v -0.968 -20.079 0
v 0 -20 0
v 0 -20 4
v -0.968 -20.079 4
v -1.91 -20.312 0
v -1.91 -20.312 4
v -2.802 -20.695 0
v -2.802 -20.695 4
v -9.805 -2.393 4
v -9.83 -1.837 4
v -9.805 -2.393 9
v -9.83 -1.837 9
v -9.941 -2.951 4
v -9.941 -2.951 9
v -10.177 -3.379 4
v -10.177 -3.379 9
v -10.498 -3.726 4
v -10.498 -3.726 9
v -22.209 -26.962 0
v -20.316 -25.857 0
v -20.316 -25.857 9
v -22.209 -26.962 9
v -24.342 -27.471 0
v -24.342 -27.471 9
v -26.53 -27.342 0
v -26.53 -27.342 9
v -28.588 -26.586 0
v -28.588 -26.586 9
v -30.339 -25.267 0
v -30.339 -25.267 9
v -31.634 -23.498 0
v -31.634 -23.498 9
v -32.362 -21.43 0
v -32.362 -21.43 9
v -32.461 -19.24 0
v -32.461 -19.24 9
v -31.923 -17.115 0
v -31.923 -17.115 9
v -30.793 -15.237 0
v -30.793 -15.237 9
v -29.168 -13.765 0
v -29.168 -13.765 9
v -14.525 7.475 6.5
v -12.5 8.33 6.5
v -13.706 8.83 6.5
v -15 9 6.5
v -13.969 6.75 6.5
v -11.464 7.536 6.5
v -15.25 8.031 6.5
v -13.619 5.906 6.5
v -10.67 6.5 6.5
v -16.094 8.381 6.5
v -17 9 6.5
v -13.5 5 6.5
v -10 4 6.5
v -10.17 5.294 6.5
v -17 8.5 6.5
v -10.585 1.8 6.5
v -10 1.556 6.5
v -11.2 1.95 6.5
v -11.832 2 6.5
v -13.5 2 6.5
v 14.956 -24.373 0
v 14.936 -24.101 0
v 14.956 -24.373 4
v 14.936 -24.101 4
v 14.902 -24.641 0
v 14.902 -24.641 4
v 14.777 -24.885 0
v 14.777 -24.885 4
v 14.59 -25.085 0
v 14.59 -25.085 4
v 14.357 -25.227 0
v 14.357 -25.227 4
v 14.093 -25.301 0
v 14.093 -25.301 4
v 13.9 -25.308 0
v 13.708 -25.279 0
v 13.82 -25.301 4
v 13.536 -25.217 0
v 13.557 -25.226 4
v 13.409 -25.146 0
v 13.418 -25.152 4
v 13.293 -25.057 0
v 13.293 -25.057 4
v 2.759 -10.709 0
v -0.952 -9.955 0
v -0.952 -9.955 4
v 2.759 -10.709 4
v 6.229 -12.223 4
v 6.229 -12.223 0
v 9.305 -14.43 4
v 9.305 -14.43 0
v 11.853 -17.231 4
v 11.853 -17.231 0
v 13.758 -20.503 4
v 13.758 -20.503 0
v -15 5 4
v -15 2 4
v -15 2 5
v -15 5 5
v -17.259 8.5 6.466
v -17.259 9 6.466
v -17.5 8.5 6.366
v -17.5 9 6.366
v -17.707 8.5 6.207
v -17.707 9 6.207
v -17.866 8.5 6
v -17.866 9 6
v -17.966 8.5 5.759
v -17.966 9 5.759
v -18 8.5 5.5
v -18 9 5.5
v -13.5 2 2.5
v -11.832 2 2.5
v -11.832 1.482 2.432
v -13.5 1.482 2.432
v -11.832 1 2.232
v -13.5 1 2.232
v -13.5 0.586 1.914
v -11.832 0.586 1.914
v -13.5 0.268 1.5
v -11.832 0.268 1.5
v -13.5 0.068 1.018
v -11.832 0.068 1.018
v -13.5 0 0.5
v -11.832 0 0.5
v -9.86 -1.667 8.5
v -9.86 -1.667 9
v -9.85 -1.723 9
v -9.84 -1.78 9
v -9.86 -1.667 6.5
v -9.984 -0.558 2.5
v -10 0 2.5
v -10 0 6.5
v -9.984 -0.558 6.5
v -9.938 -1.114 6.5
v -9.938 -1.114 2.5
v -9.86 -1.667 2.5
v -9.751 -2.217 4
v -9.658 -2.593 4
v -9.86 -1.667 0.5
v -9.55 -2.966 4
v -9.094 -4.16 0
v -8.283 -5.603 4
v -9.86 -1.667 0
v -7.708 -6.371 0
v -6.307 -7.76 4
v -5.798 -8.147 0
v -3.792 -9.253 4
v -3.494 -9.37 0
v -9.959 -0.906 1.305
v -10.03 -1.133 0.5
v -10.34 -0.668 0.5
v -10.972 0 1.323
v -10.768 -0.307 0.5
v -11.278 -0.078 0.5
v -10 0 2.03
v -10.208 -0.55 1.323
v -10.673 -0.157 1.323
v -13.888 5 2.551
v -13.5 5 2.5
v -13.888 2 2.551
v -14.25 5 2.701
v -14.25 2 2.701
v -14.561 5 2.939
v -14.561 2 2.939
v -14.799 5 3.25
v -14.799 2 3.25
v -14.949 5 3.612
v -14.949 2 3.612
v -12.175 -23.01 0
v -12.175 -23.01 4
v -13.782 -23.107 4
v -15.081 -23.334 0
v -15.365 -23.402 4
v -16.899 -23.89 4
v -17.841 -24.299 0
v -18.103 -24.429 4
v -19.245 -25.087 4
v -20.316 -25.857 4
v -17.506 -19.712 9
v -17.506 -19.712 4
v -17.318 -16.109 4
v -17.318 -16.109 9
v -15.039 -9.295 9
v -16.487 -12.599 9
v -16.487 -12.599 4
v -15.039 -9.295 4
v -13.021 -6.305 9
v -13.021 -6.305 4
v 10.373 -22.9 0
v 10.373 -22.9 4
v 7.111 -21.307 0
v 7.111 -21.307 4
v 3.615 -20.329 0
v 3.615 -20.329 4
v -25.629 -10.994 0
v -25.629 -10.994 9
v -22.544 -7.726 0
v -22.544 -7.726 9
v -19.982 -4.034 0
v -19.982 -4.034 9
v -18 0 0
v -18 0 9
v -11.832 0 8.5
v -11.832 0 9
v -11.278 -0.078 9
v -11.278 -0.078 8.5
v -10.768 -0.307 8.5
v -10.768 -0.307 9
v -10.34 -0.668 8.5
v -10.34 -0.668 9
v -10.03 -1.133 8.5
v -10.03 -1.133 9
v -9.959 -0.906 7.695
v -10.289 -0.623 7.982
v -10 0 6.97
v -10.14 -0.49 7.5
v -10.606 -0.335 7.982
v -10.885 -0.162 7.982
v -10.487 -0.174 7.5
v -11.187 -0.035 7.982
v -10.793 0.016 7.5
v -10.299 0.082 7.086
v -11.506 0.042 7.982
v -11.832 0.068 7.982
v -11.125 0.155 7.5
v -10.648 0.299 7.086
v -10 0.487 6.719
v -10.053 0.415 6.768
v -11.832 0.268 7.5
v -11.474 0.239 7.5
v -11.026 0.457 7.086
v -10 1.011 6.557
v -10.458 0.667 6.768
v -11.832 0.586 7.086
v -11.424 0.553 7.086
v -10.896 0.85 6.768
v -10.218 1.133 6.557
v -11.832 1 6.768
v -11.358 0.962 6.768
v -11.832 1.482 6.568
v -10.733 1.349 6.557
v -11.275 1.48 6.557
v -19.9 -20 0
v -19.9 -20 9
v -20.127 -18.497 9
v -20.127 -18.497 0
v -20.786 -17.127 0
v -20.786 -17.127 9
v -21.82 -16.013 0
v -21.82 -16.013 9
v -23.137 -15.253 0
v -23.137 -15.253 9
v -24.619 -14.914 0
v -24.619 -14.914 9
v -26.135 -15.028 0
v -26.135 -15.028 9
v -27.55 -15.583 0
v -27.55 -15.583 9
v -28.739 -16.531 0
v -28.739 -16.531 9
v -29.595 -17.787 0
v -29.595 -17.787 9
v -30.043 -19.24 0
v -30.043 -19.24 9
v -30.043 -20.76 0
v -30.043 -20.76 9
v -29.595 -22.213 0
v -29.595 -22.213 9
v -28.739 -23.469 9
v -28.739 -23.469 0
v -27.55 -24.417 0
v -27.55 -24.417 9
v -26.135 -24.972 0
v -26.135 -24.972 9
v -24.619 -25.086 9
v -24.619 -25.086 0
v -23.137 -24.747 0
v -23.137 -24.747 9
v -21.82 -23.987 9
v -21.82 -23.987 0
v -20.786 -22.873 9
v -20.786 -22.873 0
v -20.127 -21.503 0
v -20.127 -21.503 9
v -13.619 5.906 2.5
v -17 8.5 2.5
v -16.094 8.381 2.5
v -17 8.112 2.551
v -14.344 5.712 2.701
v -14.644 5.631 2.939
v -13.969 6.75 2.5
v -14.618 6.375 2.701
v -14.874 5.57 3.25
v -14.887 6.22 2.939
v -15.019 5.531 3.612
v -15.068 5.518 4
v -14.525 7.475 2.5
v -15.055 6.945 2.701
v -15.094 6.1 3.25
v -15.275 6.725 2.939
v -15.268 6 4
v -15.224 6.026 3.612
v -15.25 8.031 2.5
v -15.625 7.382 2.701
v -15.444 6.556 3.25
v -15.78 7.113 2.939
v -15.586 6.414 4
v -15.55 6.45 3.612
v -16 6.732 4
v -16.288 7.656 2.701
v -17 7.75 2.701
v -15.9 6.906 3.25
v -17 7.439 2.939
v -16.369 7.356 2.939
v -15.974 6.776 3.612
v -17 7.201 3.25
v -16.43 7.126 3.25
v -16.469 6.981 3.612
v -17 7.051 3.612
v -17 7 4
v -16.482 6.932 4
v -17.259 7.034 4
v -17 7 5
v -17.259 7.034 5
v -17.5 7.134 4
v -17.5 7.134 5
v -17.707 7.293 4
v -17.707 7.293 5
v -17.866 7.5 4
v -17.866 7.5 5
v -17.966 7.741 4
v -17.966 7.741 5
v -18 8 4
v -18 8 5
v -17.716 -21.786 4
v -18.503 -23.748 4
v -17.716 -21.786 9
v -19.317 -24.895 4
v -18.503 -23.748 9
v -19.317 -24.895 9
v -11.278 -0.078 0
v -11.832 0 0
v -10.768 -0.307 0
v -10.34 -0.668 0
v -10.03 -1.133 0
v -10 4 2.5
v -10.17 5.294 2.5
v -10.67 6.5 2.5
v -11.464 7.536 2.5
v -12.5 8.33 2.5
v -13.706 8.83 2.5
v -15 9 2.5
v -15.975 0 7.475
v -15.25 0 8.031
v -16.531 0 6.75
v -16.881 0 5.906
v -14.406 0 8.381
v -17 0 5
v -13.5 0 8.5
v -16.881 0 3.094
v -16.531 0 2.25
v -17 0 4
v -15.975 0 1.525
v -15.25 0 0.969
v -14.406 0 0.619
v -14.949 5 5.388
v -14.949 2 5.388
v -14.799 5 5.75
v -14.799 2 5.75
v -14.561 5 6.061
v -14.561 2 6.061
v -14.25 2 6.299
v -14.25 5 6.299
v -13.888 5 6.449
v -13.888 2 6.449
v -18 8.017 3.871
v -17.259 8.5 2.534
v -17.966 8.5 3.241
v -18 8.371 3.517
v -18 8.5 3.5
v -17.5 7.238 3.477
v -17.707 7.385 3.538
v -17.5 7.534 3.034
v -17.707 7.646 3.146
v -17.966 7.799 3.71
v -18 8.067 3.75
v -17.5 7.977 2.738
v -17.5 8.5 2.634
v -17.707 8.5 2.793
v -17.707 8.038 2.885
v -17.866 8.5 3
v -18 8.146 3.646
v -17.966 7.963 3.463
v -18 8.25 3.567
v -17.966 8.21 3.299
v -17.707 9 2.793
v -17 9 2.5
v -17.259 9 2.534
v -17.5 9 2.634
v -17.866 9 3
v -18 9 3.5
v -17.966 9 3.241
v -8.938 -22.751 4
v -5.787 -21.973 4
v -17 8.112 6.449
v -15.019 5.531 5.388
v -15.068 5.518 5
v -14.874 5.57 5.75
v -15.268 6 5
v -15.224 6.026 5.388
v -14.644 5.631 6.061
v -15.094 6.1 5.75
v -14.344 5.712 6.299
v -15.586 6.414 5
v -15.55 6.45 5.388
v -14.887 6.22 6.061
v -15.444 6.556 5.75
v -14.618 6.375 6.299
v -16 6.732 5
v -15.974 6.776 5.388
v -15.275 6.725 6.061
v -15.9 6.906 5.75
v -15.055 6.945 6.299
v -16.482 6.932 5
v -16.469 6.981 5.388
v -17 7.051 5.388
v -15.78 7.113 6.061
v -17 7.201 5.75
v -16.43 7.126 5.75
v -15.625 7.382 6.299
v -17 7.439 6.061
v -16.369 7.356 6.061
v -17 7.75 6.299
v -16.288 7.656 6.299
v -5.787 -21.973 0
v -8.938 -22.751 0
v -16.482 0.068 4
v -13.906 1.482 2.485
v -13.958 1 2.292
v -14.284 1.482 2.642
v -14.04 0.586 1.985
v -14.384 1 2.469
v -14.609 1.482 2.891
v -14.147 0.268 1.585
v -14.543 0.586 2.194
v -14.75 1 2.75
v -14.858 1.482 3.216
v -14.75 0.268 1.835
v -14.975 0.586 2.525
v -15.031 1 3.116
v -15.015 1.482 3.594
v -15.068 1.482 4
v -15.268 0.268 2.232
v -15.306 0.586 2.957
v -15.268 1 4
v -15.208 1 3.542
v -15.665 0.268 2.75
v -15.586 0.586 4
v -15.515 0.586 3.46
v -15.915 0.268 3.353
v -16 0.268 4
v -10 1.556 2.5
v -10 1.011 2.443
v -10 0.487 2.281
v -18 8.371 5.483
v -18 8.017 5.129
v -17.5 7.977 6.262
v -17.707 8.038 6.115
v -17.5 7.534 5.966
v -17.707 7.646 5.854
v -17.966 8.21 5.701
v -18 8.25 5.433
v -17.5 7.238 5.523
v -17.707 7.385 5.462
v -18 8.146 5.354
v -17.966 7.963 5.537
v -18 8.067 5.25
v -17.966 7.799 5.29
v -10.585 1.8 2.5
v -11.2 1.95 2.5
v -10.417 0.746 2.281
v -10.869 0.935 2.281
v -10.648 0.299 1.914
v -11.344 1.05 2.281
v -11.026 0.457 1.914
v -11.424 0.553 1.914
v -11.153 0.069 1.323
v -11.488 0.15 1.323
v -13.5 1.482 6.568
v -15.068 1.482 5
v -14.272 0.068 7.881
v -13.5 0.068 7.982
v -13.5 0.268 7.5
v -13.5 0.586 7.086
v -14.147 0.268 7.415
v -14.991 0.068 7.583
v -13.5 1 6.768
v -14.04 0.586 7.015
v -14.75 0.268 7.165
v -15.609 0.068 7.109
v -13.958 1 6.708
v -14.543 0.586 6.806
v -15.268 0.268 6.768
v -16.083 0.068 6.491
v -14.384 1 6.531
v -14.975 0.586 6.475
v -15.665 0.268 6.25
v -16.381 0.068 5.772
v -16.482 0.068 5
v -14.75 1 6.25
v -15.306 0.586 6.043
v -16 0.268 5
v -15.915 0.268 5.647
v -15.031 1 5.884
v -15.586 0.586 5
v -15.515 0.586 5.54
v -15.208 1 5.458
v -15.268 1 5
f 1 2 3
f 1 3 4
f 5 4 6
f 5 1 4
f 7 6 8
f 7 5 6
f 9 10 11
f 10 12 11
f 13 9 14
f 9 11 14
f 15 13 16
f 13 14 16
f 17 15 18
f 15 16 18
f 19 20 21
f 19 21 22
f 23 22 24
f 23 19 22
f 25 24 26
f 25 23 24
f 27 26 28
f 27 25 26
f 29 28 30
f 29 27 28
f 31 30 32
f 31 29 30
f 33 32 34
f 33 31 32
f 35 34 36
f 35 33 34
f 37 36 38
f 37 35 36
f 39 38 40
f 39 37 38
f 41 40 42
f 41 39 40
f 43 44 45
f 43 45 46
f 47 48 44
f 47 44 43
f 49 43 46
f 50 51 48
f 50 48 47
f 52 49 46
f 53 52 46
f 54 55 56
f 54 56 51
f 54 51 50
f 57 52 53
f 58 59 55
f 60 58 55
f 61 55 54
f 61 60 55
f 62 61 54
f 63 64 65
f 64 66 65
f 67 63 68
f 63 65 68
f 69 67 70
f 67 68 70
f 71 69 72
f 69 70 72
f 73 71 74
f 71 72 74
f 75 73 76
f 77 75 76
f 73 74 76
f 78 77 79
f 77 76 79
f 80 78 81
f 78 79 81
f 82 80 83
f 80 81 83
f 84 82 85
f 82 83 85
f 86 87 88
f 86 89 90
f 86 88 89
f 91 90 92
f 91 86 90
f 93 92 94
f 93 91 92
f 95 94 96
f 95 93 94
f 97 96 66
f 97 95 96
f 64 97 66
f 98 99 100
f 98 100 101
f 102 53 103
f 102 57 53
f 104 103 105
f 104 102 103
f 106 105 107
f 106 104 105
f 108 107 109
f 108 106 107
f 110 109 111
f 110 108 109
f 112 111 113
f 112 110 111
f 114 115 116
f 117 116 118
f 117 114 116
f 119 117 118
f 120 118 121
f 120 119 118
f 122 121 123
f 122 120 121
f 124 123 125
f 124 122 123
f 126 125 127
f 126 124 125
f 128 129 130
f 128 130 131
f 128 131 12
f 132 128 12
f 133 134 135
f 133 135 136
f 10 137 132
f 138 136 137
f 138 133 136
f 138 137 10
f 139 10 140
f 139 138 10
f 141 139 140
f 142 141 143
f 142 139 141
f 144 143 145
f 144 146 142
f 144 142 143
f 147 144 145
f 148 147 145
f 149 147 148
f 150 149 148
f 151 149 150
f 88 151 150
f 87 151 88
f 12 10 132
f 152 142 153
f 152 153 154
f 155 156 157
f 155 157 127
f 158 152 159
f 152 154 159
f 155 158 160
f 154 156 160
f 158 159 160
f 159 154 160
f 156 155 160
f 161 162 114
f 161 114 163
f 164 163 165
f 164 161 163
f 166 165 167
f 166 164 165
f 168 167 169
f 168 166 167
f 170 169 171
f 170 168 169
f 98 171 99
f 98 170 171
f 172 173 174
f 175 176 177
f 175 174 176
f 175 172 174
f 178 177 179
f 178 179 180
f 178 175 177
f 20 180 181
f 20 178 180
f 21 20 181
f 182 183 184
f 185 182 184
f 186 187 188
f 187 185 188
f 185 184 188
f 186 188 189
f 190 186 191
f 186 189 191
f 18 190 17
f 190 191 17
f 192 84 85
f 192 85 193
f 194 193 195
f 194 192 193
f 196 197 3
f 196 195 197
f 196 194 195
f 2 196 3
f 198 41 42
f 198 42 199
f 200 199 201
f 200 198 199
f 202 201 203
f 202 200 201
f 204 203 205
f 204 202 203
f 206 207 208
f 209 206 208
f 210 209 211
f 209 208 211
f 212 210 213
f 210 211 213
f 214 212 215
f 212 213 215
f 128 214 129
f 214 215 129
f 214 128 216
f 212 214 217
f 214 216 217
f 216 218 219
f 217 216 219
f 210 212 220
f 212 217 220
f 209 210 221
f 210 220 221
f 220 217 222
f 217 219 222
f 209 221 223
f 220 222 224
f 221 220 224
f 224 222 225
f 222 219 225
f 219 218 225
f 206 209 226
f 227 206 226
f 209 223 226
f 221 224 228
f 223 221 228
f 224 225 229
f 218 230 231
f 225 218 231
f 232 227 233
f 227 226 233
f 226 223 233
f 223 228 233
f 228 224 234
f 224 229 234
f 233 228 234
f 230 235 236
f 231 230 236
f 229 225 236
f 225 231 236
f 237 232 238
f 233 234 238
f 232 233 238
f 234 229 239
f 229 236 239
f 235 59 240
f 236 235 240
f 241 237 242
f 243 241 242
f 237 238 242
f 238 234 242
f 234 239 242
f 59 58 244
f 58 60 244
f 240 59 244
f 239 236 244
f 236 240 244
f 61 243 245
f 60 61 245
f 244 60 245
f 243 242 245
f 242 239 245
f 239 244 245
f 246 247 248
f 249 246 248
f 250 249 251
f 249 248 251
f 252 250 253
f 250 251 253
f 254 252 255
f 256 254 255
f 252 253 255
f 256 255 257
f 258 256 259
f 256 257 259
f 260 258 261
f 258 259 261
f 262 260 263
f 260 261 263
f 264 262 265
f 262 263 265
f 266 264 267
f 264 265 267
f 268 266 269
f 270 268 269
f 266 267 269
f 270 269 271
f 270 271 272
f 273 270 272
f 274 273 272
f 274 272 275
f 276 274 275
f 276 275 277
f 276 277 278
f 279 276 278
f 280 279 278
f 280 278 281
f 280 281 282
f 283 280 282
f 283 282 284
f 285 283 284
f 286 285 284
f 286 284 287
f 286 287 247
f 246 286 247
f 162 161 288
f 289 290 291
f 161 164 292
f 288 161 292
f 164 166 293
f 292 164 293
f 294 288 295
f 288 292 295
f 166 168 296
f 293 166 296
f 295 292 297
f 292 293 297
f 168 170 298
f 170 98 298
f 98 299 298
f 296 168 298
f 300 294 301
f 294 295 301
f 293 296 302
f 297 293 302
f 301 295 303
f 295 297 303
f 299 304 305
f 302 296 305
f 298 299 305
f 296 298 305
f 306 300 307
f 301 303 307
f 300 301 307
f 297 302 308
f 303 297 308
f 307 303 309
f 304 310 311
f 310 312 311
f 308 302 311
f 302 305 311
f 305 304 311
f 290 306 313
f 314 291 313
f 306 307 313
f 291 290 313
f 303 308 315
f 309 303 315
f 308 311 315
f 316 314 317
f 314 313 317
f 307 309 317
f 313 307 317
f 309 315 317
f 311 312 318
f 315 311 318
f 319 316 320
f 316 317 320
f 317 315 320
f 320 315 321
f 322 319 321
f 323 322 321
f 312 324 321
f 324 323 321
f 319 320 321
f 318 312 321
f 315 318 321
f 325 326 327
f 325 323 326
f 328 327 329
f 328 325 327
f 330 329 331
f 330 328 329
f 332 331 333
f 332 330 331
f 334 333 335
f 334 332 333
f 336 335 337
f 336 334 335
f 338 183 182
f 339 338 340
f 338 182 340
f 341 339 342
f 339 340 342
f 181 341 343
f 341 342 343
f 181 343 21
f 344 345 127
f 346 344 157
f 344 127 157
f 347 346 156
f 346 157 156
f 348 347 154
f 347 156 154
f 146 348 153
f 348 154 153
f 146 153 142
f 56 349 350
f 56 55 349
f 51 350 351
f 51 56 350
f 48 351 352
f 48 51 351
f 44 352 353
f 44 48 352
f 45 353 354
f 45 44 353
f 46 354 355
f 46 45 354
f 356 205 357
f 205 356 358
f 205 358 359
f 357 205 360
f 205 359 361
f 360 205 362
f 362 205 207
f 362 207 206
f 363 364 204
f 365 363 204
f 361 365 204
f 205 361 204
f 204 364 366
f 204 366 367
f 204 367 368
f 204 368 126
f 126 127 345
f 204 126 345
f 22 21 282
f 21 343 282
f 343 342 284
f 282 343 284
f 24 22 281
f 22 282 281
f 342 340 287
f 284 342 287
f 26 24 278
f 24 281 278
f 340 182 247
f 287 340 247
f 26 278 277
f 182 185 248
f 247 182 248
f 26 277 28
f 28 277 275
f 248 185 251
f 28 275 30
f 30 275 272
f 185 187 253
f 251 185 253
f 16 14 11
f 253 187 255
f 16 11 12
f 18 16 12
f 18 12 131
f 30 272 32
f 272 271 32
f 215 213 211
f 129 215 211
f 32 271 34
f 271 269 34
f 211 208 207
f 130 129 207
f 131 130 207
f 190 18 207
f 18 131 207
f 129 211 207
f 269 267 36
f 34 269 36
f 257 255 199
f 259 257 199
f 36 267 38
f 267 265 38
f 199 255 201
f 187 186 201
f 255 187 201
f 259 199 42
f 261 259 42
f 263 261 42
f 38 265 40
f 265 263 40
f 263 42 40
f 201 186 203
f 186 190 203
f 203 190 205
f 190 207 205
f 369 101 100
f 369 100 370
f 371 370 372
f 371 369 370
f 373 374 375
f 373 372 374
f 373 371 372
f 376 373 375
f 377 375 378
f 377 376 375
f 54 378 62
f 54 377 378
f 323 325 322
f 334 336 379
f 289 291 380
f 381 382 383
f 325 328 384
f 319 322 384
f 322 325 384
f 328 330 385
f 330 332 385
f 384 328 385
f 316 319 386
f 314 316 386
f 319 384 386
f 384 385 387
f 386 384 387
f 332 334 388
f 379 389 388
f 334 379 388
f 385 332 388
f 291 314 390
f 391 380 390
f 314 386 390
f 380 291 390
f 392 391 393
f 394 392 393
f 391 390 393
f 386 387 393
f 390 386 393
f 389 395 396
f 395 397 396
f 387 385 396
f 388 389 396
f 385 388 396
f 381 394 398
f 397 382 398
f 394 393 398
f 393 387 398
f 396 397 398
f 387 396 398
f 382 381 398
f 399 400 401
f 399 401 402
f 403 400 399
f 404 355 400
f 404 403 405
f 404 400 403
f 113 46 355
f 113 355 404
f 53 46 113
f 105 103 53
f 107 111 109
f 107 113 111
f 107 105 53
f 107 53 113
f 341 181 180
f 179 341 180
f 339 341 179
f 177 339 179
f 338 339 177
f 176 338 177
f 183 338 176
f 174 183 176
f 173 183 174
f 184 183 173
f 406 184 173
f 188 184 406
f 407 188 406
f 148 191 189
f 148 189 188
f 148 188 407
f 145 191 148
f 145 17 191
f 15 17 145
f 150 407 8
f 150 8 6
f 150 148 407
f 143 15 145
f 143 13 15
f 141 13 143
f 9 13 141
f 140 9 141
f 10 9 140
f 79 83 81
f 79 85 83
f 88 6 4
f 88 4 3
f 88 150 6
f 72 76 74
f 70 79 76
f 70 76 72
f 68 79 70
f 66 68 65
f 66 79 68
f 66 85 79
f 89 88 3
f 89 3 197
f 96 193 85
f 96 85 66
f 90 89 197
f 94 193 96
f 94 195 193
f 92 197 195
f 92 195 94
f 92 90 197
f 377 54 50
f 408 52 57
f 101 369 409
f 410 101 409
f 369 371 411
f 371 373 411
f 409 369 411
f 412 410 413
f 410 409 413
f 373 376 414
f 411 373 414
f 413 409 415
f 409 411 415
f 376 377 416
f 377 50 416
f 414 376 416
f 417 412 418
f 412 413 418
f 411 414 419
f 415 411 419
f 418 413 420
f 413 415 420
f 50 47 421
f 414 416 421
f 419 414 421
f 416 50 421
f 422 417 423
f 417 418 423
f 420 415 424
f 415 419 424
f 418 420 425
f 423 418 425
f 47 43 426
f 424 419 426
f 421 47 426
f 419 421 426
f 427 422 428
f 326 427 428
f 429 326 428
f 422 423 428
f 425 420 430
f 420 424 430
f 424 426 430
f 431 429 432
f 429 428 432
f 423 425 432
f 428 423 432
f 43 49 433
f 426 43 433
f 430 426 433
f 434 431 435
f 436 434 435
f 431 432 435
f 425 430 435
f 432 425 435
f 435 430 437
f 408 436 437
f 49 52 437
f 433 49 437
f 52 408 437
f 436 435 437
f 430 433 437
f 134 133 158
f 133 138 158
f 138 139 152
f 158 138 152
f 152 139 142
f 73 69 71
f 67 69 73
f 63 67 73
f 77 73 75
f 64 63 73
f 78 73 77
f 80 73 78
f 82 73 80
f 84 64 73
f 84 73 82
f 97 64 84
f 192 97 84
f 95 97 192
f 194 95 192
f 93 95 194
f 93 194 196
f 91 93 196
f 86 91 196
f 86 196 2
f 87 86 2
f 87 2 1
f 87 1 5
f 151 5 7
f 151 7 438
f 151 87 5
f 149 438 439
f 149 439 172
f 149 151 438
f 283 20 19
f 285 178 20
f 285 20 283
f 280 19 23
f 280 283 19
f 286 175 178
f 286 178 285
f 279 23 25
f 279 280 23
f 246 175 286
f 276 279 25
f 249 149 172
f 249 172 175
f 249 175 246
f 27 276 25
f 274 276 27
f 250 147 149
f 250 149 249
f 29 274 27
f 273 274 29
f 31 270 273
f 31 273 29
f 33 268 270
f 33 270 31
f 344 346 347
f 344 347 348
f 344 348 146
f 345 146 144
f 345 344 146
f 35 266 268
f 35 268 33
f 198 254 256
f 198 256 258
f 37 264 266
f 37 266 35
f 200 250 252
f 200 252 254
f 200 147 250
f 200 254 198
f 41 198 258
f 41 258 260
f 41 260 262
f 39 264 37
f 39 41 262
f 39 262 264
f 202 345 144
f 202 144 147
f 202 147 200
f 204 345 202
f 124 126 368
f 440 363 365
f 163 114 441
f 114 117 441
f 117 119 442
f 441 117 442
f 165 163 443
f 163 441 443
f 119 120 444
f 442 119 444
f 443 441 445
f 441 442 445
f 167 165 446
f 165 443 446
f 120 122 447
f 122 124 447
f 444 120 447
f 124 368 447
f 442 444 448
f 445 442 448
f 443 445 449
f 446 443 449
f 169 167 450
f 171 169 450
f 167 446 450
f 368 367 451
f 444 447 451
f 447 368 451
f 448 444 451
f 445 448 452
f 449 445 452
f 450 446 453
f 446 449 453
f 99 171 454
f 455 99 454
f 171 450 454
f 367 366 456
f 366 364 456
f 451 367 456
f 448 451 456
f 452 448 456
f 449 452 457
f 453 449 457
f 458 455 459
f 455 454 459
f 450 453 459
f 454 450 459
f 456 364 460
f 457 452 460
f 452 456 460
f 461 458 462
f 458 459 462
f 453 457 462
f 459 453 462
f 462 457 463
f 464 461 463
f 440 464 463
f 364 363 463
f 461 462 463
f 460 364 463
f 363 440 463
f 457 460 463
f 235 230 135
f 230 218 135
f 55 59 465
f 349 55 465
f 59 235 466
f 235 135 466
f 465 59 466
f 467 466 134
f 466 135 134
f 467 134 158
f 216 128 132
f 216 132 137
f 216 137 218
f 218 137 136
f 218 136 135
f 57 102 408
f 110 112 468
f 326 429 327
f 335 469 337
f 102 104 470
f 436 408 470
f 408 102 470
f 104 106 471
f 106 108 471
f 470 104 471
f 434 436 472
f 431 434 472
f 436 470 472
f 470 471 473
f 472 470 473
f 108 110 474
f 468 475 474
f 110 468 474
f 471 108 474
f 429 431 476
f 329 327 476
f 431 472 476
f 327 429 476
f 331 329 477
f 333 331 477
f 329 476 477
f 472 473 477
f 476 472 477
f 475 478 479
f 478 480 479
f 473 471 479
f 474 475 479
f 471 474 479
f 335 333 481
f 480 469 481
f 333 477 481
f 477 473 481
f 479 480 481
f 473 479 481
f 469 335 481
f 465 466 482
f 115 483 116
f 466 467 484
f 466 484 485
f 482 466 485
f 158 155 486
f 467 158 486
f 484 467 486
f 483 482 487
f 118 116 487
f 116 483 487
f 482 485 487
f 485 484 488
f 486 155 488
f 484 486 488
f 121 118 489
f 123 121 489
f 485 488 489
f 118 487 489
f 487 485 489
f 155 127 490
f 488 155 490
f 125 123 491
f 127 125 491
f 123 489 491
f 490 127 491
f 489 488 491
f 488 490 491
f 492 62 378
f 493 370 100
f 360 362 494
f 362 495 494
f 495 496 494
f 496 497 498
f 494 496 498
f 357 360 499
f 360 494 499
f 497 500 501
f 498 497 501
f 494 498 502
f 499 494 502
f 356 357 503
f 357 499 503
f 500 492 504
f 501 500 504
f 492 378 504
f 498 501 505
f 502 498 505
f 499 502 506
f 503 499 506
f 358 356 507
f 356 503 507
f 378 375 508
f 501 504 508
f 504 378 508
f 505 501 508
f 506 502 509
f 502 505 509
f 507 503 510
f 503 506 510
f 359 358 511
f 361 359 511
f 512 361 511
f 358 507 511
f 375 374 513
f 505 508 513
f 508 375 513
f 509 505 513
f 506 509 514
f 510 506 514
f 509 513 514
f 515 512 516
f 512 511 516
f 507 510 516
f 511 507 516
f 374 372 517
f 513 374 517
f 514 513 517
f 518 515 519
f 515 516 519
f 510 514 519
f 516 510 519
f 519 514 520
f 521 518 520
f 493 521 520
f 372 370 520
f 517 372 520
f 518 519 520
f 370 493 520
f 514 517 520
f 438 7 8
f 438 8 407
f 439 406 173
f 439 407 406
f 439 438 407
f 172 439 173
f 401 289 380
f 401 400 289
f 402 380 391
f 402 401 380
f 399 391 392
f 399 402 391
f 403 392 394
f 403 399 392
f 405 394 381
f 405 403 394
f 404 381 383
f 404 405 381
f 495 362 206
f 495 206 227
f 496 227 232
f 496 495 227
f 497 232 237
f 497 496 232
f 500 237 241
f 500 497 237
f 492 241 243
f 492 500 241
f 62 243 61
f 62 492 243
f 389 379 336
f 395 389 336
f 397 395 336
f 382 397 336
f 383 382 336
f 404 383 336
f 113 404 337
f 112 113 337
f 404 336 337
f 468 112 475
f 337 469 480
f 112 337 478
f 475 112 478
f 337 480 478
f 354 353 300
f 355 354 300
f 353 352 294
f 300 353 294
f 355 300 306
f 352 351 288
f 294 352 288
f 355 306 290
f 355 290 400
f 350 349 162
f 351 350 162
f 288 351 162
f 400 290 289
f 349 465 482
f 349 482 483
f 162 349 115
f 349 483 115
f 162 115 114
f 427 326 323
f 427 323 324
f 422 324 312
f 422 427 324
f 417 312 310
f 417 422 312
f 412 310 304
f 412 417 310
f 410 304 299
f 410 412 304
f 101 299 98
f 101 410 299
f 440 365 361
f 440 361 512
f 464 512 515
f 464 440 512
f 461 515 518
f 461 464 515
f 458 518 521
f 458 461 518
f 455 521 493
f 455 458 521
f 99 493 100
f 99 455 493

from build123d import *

# Parameters (mm, degrees)
EXTRUDE_1_DEPTH     = 9
CUT_EXTRUDE_START   = -5
CUT_EXTRUDE_1_DEPTH = 5
SKETCH_12_W         = 2.5
SKETCH_12_H         = 7
CUT_EXTRUDE_3_DEPTH = 42.911887352
FILLET_11_R         = 2
FILLET_1_R          = 1
SKETCH_10_W         = 8
SKETCH_10_H         = 4
EXTRUDE_3_DEPTH     = 2
FILLET_5_R          = 5
FILLET_10_R         = 7.5
FILLET_14_R         = 2
FILLET_15_R         = 1.5
FILLET_16_R         = 2
FILLET_17_R         = 1
FILLET_18_R         = 2
SKETCH_11_R         = 5.1
CUT_EXTRUDE_2_DEPTH = 44.514365603


# Some blends are built 0.0001 mm under size
with BuildPart() as part:
    # Эскиз2 → Бобышка-Вытянуть1 (new body)
    with BuildSketch(Plane.XY):
        with BuildLine():
            Line((-18, 0), (-15, 0))
            Line((-15, 0), (-15, 7))
            Line((-15, 7), (-10, 7))
            Line((-10, 7), (-10, 0))
            ThreePointArc((-10, 0), (-7.39984978, -6.726233956), (-0.951555354, -9.954624172))
            ThreePointArc((-0.951555354, -9.954624172), (10.407523967, -15.498539394), (15.320888862, -27.144247806))
            ThreePointArc((15.320888862, -27.144247806), (8.452365235, -21.873844259), (0, -20))
            ThreePointArc((0, -20), (-1.44344914, -20.176216472), (-2.802111775, -20.69451514))
            ThreePointArc((-2.802111775, -20.69451514), (-7.346697493, -22.426064476), (-12.174852362, -23.009539415))
            ThreePointArc((-12.174852362, -23.009539415), (-16.488233618, -23.738589268), (-20.315570084, -25.857142338))
            ThreePointArc((-20.315570084, -25.857142338), (-31.05163084, -24.430323259), (-29.168151763, -13.764896883))
            ThreePointArc((-29.168151763, -13.764896883), (-22.544234788, -7.726123715), (-18, 0))
        make_face()
    extrude(amount=EXTRUDE_1_DEPTH)

    # Эскиз6 → Вырез-Вытянуть1 (cut)
    with BuildSketch(Plane.XY.offset(9).offset(CUT_EXTRUDE_START)):
        with BuildLine():
            ThreePointArc((-9.55, -2.96605799), (-16.390256677, -12.316180922), (-16.898984287, -23.890078556))
            ThreePointArc((-16.898984287, -23.890078556), (-14.577958647, -23.229625817), (-12.174852362, -23.009539415))
            ThreePointArc((-12.174852362, -23.009539415), (-7.346697493, -22.426064476), (-2.802111775, -20.69451514))
            ThreePointArc((-2.802111775, -20.69451514), (-1.44344914, -20.176216472), (0, -20))
            ThreePointArc((0, -20), (8.452365235, -21.873844259), (15.320888862, -27.144247806))
            ThreePointArc((15.320888862, -27.144247806), (10.407523967, -15.498539394), (-0.951555354, -9.954624172))
            ThreePointArc((-0.951555354, -9.954624172), (-6.307192762, -7.760110789), (-9.55, -2.96605799))
        make_face()
    extrude(amount=CUT_EXTRUDE_1_DEPTH, mode=Mode.SUBTRACT)

    # Эскиз12 → Вырез-Вытянуть3 (cut, through all)
    with BuildSketch(Plane.ZY.offset(15)):
        with Locations((1.25, 3.5)):
            Rectangle(SKETCH_12_W, SKETCH_12_H)
        with Locations((7.75, 3.5)):
            Rectangle(SKETCH_12_W, SKETCH_12_H)
    extrude(amount=-CUT_EXTRUDE_3_DEPTH, mode=Mode.SUBTRACT)

    # Скругление11
    fillet_11_edges = [part.edges().sort_by_distance(p)[0] for p in [
        (-10, 0, 7.75),
        (-10, 0, 1.25),
    ]]
    fillet(fillet_11_edges, radius=FILLET_11_R)

    # Скругление1
    fillet_1_edges = [part.edges().sort_by_distance(p)[0] for p in [
        (15.320888862, -27.144247806, 2),
    ]]
    fillet(fillet_1_edges, radius=FILLET_1_R)

    # Эскиз10 → Бобышка-Вытянуть3 (add)
    with BuildSketch(Plane(origin=(0, 7, 0), x_dir=(-1, 0, 0), z_dir=(0, 1, 0))):
        with Locations((14, 4.5)):
            Rectangle(SKETCH_10_W, SKETCH_10_H)
    extrude(amount=EXTRUDE_3_DEPTH)

    # Скругление5
    fillet_5_edges = [part.edges().sort_by_distance(p)[0] for p in [
        (-10, 9, 4.5),
    ]]
    fillet(fillet_5_edges, radius=FILLET_5_R)

    # Скругление10
    fillet_10_edges = [part.edges().sort_by_distance(p)[0] for p in [
        (-16.898984287, -23.890078556, 6.5),
    ]]
    fillet(fillet_10_edges, radius=FILLET_10_R - 0.0001)  # a hair under: the kernel refuses the full size

    # Скругление14
    fillet_14_edges = [part.edges().sort_by_distance(p)[0] for p in [
        (-15, 7, 4.5),
    ]]
    fillet(fillet_14_edges, radius=FILLET_14_R)

    # Скругление15
    fillet_15_edges = [part.edges().sort_by_distance(p)[0] for p in [
        (-17.5, 7, 6.5),
        (-15, 2.5, 6.5),
        (-17.5, 7, 2.5),
        (-15.585786438, 6.414213562, 2.5),
        (-15.585786438, 6.414213562, 6.5),
        (-15, 2.5, 2.5),
    ]]
    fillet(fillet_15_edges, radius=FILLET_15_R)

    # Скругление16
    # the kernel refuses this fillet: 2 mm, written as the material it adds along each edge
    with BuildSketch(Plane(origin=(-11.832159566, -2, 6.5), x_dir=(-0.6907726827654878, -0.7230719886325089, 0), z_dir=(-0.7230719886325089, 0.6907726827654878, 0))) as fillet_16_piece_1_section:
        with BuildLine():
            CenterArc((2 + FILLET_16_R, FILLET_16_R), FILLET_16_R, 180, 90)
            Line((2, FILLET_16_R), (2, 0))
            Line((2, 0), (2 + FILLET_16_R, 0))
        make_face()
    fillet_16_piece_1 = revolve(axis=Axis((-11.832159566, -2, 6.5), (0, 0, 1)), revolution_arc=223.691304566, mode=Mode.PRIVATE)
    fillet_16_piece_1 = split(fillet_16_piece_1, bisect_by=Plane(origin=(-9.962064569, 0, 7.231915875), z_dir=(0, -1, 0)), keep=Keep.TOP, mode=Mode.PRIVATE)
    fillet_16_piece_1 = fillet_16_piece_1 - Plane(origin=(0, 0, 7.231915875), x_dir=(-1, 0, 0), z_dir=(0, 0, -1)) * Cylinder(10, 17, mode=Mode.PRIVATE)
    fillet_16_piece_1 = fillet_16_piece_1 - Plane(origin=(2.479707116, -18.943734501, 7.231915875), x_dir=(-0.6014853558135568, 0.7988838255602869, 0), z_dir=(0, 0, -1)) * Cylinder(20, 17, mode=Mode.PRIVATE)
    add(fillet_16_piece_1)
    with BuildSketch(Plane(origin=(-11.832159566, -2, 6.5), x_dir=(-0.6907726827654878, -0.7230719886325089, 0), z_dir=(-0.7230719886325089, 0.6907726827654878, 0))) as fillet_16_piece_2_section:
        with BuildLine():
            CenterArc((2 + FILLET_16_R, FILLET_16_R), FILLET_16_R, 180, 90)
            Line((2, FILLET_16_R), (2, 0))
            Line((2, 0), (2 + FILLET_16_R, 0))
        make_face()
    fillet_16_piece_2 = revolve(axis=Axis((-11.832159566, -2, 6.5), (0, 0, 1)), revolution_arc=223.691304566, mode=Mode.PRIVATE)
    fillet_16_piece_2 = split(fillet_16_piece_2, bisect_by=Plane(origin=(-11.088968436, 0, 6.841402023), z_dir=(0, 1, 0)), keep=Keep.TOP, mode=Mode.PRIVATE)
    fillet_16_piece_2 = split(fillet_16_piece_2, bisect_by=Plane(origin=(-10, 0.441530369, 6.841402023), z_dir=(-1, 0, 0)), keep=Keep.TOP, mode=Mode.PRIVATE)
    add(fillet_16_piece_2)
    with BuildSketch(Plane(origin=(-13.5, 0, 6.5), x_dir=(0, 0, 1), z_dir=(1, 0, 0))) as fillet_16_piece_3:
        with BuildLine():
            CenterArc((FILLET_16_R, -FILLET_16_R), FILLET_16_R, 90, 90)
            Line((0, -FILLET_16_R), (0, 0))
            Line((0, 0), (FILLET_16_R, 0))
        make_face()
    extrude(amount=1.667840434)
    with BuildSketch(Plane(origin=(-11.832159566, -2, 2.5), x_dir=(-0.6907726827654875, -0.7230719886325091, 0), z_dir=(-0.7230719886325091, 0.6907726827654875, 0))) as fillet_16_piece_4_section:
        with BuildLine():
            CenterArc((2 + FILLET_16_R, -FILLET_16_R), FILLET_16_R, 90, 90)
            Line((2, -FILLET_16_R), (2, 0))
            Line((2, 0), (2 + FILLET_16_R, 0))
        make_face()
    fillet_16_piece_4 = revolve(axis=Axis((-11.832159566, -2, 2.5), (0, 0, 1)), revolution_arc=223.691304566, mode=Mode.PRIVATE)
    fillet_16_piece_4 = split(fillet_16_piece_4, bisect_by=Plane(origin=(-9.962064569, 0, 1.768084125), z_dir=(0, -1, 0)), keep=Keep.TOP, mode=Mode.PRIVATE)
    fillet_16_piece_4 = fillet_16_piece_4 - Plane(origin=(0, 0, 1.768084125), x_dir=(-1, 0, 0), z_dir=(0, 0, -1)) * Cylinder(10, 17, mode=Mode.PRIVATE)
    add(fillet_16_piece_4)
    with BuildSketch(Plane(origin=(-11.832159566, -2, 2.5), x_dir=(-0.6907726827654875, -0.7230719886325091, 0), z_dir=(-0.7230719886325091, 0.6907726827654875, 0))) as fillet_16_piece_5_section:
        with BuildLine():
            CenterArc((2 + FILLET_16_R, -FILLET_16_R), FILLET_16_R, 90, 90)
            Line((2, -FILLET_16_R), (2, 0))
            Line((2, 0), (2 + FILLET_16_R, 0))
        make_face()
    fillet_16_piece_5 = revolve(axis=Axis((-11.832159566, -2, 2.5), (0, 0, 1)), revolution_arc=223.691304566, mode=Mode.PRIVATE)
    fillet_16_piece_5 = split(fillet_16_piece_5, bisect_by=Plane(origin=(-10, 0.441530341, 2.15859789), z_dir=(-1, 0, 0)), keep=Keep.TOP, mode=Mode.PRIVATE)
    add(fillet_16_piece_5)
    with BuildSketch(Plane(origin=(-13.5, 0, 2.5), x_dir=(0, 0, -1), z_dir=(1, 0, 0))) as fillet_16_piece_6:
        with BuildLine():
            CenterArc((FILLET_16_R, FILLET_16_R), FILLET_16_R, 180, 90)
            Line((0, FILLET_16_R), (0, 0))
            Line((0, 0), (FILLET_16_R, 0))
        make_face()
    extrude(amount=1.667840434)
    with BuildSketch(Plane(origin=(-13.5, 0, 4), x_dir=(0, 0, -1), z_dir=(1, 0, 0))) as fillet_16_piece_7:
        with BuildLine():
            CenterArc((1.5 + FILLET_16_R, FILLET_16_R), FILLET_16_R, 180, 90)
            Line((1.5 + FILLET_16_R, 0), (1.5, 0))
            Line((1.5, 0), (1.5, FILLET_16_R))
        make_face()
    revolve(axis=Axis((-13.5, 0, 4), (0, 1, 0)), revolution_arc=90)
    with BuildSketch(Plane(origin=(-15, 0, 4), x_dir=(0, 1, 0), z_dir=(0, 0, 1))) as fillet_16_piece_8:
        with BuildLine():
            CenterArc((FILLET_16_R, FILLET_16_R), FILLET_16_R, 180, 90)
            Line((0, FILLET_16_R), (0, 0))
            Line((0, 0), (FILLET_16_R, 0))
        make_face()
    extrude(amount=1)
    with BuildSketch(Plane(origin=(-13.5, 0, 5), x_dir=(0, 0, 1), z_dir=(1, 0, 0))) as fillet_16_piece_9:
        with BuildLine():
            CenterArc((1.5 + FILLET_16_R, -FILLET_16_R), FILLET_16_R, 90, 90)
            Line((1.5 + FILLET_16_R, 0), (1.5, 0))
            Line((1.5, 0), (1.5, -FILLET_16_R))
        make_face()
    revolve(axis=Axis((-13.5, 0, 5), (0, -1, 0)), revolution_arc=90)

    # Скругление17
    fillet_17_edges = [part.edges().sort_by_distance(p)[0] for p in [
        (-18, 8.75, 2.5),
        (-18, 7.439339828, 2.939339828),
        (-18, 7, 4.5),
        (-18, 8.75, 6.5),
        (-18, 7.439339828, 6.060660172),
    ]]
    fillet(fillet_17_edges, radius=FILLET_17_R - 0.0001)  # a hair under: the kernel refuses the full size

    # Скругление18
    fillet_18_edges = [part.edges().sort_by_distance(p)[0] for p in [
        (-9.55, -2.96605799, 5.25),
    ]]
    fillet(fillet_18_edges, radius=FILLET_18_R)

    # Эскиз11 → Вырез-Вытянуть2 (cut, through all)
    with BuildSketch(Plane.XY.offset(9)):
        with Locations((-25, -20)):
            Circle(SKETCH_11_R)
    extrude(amount=-CUT_EXTRUDE_2_DEPTH, mode=Mode.SUBTRACT)


solid = part.part
